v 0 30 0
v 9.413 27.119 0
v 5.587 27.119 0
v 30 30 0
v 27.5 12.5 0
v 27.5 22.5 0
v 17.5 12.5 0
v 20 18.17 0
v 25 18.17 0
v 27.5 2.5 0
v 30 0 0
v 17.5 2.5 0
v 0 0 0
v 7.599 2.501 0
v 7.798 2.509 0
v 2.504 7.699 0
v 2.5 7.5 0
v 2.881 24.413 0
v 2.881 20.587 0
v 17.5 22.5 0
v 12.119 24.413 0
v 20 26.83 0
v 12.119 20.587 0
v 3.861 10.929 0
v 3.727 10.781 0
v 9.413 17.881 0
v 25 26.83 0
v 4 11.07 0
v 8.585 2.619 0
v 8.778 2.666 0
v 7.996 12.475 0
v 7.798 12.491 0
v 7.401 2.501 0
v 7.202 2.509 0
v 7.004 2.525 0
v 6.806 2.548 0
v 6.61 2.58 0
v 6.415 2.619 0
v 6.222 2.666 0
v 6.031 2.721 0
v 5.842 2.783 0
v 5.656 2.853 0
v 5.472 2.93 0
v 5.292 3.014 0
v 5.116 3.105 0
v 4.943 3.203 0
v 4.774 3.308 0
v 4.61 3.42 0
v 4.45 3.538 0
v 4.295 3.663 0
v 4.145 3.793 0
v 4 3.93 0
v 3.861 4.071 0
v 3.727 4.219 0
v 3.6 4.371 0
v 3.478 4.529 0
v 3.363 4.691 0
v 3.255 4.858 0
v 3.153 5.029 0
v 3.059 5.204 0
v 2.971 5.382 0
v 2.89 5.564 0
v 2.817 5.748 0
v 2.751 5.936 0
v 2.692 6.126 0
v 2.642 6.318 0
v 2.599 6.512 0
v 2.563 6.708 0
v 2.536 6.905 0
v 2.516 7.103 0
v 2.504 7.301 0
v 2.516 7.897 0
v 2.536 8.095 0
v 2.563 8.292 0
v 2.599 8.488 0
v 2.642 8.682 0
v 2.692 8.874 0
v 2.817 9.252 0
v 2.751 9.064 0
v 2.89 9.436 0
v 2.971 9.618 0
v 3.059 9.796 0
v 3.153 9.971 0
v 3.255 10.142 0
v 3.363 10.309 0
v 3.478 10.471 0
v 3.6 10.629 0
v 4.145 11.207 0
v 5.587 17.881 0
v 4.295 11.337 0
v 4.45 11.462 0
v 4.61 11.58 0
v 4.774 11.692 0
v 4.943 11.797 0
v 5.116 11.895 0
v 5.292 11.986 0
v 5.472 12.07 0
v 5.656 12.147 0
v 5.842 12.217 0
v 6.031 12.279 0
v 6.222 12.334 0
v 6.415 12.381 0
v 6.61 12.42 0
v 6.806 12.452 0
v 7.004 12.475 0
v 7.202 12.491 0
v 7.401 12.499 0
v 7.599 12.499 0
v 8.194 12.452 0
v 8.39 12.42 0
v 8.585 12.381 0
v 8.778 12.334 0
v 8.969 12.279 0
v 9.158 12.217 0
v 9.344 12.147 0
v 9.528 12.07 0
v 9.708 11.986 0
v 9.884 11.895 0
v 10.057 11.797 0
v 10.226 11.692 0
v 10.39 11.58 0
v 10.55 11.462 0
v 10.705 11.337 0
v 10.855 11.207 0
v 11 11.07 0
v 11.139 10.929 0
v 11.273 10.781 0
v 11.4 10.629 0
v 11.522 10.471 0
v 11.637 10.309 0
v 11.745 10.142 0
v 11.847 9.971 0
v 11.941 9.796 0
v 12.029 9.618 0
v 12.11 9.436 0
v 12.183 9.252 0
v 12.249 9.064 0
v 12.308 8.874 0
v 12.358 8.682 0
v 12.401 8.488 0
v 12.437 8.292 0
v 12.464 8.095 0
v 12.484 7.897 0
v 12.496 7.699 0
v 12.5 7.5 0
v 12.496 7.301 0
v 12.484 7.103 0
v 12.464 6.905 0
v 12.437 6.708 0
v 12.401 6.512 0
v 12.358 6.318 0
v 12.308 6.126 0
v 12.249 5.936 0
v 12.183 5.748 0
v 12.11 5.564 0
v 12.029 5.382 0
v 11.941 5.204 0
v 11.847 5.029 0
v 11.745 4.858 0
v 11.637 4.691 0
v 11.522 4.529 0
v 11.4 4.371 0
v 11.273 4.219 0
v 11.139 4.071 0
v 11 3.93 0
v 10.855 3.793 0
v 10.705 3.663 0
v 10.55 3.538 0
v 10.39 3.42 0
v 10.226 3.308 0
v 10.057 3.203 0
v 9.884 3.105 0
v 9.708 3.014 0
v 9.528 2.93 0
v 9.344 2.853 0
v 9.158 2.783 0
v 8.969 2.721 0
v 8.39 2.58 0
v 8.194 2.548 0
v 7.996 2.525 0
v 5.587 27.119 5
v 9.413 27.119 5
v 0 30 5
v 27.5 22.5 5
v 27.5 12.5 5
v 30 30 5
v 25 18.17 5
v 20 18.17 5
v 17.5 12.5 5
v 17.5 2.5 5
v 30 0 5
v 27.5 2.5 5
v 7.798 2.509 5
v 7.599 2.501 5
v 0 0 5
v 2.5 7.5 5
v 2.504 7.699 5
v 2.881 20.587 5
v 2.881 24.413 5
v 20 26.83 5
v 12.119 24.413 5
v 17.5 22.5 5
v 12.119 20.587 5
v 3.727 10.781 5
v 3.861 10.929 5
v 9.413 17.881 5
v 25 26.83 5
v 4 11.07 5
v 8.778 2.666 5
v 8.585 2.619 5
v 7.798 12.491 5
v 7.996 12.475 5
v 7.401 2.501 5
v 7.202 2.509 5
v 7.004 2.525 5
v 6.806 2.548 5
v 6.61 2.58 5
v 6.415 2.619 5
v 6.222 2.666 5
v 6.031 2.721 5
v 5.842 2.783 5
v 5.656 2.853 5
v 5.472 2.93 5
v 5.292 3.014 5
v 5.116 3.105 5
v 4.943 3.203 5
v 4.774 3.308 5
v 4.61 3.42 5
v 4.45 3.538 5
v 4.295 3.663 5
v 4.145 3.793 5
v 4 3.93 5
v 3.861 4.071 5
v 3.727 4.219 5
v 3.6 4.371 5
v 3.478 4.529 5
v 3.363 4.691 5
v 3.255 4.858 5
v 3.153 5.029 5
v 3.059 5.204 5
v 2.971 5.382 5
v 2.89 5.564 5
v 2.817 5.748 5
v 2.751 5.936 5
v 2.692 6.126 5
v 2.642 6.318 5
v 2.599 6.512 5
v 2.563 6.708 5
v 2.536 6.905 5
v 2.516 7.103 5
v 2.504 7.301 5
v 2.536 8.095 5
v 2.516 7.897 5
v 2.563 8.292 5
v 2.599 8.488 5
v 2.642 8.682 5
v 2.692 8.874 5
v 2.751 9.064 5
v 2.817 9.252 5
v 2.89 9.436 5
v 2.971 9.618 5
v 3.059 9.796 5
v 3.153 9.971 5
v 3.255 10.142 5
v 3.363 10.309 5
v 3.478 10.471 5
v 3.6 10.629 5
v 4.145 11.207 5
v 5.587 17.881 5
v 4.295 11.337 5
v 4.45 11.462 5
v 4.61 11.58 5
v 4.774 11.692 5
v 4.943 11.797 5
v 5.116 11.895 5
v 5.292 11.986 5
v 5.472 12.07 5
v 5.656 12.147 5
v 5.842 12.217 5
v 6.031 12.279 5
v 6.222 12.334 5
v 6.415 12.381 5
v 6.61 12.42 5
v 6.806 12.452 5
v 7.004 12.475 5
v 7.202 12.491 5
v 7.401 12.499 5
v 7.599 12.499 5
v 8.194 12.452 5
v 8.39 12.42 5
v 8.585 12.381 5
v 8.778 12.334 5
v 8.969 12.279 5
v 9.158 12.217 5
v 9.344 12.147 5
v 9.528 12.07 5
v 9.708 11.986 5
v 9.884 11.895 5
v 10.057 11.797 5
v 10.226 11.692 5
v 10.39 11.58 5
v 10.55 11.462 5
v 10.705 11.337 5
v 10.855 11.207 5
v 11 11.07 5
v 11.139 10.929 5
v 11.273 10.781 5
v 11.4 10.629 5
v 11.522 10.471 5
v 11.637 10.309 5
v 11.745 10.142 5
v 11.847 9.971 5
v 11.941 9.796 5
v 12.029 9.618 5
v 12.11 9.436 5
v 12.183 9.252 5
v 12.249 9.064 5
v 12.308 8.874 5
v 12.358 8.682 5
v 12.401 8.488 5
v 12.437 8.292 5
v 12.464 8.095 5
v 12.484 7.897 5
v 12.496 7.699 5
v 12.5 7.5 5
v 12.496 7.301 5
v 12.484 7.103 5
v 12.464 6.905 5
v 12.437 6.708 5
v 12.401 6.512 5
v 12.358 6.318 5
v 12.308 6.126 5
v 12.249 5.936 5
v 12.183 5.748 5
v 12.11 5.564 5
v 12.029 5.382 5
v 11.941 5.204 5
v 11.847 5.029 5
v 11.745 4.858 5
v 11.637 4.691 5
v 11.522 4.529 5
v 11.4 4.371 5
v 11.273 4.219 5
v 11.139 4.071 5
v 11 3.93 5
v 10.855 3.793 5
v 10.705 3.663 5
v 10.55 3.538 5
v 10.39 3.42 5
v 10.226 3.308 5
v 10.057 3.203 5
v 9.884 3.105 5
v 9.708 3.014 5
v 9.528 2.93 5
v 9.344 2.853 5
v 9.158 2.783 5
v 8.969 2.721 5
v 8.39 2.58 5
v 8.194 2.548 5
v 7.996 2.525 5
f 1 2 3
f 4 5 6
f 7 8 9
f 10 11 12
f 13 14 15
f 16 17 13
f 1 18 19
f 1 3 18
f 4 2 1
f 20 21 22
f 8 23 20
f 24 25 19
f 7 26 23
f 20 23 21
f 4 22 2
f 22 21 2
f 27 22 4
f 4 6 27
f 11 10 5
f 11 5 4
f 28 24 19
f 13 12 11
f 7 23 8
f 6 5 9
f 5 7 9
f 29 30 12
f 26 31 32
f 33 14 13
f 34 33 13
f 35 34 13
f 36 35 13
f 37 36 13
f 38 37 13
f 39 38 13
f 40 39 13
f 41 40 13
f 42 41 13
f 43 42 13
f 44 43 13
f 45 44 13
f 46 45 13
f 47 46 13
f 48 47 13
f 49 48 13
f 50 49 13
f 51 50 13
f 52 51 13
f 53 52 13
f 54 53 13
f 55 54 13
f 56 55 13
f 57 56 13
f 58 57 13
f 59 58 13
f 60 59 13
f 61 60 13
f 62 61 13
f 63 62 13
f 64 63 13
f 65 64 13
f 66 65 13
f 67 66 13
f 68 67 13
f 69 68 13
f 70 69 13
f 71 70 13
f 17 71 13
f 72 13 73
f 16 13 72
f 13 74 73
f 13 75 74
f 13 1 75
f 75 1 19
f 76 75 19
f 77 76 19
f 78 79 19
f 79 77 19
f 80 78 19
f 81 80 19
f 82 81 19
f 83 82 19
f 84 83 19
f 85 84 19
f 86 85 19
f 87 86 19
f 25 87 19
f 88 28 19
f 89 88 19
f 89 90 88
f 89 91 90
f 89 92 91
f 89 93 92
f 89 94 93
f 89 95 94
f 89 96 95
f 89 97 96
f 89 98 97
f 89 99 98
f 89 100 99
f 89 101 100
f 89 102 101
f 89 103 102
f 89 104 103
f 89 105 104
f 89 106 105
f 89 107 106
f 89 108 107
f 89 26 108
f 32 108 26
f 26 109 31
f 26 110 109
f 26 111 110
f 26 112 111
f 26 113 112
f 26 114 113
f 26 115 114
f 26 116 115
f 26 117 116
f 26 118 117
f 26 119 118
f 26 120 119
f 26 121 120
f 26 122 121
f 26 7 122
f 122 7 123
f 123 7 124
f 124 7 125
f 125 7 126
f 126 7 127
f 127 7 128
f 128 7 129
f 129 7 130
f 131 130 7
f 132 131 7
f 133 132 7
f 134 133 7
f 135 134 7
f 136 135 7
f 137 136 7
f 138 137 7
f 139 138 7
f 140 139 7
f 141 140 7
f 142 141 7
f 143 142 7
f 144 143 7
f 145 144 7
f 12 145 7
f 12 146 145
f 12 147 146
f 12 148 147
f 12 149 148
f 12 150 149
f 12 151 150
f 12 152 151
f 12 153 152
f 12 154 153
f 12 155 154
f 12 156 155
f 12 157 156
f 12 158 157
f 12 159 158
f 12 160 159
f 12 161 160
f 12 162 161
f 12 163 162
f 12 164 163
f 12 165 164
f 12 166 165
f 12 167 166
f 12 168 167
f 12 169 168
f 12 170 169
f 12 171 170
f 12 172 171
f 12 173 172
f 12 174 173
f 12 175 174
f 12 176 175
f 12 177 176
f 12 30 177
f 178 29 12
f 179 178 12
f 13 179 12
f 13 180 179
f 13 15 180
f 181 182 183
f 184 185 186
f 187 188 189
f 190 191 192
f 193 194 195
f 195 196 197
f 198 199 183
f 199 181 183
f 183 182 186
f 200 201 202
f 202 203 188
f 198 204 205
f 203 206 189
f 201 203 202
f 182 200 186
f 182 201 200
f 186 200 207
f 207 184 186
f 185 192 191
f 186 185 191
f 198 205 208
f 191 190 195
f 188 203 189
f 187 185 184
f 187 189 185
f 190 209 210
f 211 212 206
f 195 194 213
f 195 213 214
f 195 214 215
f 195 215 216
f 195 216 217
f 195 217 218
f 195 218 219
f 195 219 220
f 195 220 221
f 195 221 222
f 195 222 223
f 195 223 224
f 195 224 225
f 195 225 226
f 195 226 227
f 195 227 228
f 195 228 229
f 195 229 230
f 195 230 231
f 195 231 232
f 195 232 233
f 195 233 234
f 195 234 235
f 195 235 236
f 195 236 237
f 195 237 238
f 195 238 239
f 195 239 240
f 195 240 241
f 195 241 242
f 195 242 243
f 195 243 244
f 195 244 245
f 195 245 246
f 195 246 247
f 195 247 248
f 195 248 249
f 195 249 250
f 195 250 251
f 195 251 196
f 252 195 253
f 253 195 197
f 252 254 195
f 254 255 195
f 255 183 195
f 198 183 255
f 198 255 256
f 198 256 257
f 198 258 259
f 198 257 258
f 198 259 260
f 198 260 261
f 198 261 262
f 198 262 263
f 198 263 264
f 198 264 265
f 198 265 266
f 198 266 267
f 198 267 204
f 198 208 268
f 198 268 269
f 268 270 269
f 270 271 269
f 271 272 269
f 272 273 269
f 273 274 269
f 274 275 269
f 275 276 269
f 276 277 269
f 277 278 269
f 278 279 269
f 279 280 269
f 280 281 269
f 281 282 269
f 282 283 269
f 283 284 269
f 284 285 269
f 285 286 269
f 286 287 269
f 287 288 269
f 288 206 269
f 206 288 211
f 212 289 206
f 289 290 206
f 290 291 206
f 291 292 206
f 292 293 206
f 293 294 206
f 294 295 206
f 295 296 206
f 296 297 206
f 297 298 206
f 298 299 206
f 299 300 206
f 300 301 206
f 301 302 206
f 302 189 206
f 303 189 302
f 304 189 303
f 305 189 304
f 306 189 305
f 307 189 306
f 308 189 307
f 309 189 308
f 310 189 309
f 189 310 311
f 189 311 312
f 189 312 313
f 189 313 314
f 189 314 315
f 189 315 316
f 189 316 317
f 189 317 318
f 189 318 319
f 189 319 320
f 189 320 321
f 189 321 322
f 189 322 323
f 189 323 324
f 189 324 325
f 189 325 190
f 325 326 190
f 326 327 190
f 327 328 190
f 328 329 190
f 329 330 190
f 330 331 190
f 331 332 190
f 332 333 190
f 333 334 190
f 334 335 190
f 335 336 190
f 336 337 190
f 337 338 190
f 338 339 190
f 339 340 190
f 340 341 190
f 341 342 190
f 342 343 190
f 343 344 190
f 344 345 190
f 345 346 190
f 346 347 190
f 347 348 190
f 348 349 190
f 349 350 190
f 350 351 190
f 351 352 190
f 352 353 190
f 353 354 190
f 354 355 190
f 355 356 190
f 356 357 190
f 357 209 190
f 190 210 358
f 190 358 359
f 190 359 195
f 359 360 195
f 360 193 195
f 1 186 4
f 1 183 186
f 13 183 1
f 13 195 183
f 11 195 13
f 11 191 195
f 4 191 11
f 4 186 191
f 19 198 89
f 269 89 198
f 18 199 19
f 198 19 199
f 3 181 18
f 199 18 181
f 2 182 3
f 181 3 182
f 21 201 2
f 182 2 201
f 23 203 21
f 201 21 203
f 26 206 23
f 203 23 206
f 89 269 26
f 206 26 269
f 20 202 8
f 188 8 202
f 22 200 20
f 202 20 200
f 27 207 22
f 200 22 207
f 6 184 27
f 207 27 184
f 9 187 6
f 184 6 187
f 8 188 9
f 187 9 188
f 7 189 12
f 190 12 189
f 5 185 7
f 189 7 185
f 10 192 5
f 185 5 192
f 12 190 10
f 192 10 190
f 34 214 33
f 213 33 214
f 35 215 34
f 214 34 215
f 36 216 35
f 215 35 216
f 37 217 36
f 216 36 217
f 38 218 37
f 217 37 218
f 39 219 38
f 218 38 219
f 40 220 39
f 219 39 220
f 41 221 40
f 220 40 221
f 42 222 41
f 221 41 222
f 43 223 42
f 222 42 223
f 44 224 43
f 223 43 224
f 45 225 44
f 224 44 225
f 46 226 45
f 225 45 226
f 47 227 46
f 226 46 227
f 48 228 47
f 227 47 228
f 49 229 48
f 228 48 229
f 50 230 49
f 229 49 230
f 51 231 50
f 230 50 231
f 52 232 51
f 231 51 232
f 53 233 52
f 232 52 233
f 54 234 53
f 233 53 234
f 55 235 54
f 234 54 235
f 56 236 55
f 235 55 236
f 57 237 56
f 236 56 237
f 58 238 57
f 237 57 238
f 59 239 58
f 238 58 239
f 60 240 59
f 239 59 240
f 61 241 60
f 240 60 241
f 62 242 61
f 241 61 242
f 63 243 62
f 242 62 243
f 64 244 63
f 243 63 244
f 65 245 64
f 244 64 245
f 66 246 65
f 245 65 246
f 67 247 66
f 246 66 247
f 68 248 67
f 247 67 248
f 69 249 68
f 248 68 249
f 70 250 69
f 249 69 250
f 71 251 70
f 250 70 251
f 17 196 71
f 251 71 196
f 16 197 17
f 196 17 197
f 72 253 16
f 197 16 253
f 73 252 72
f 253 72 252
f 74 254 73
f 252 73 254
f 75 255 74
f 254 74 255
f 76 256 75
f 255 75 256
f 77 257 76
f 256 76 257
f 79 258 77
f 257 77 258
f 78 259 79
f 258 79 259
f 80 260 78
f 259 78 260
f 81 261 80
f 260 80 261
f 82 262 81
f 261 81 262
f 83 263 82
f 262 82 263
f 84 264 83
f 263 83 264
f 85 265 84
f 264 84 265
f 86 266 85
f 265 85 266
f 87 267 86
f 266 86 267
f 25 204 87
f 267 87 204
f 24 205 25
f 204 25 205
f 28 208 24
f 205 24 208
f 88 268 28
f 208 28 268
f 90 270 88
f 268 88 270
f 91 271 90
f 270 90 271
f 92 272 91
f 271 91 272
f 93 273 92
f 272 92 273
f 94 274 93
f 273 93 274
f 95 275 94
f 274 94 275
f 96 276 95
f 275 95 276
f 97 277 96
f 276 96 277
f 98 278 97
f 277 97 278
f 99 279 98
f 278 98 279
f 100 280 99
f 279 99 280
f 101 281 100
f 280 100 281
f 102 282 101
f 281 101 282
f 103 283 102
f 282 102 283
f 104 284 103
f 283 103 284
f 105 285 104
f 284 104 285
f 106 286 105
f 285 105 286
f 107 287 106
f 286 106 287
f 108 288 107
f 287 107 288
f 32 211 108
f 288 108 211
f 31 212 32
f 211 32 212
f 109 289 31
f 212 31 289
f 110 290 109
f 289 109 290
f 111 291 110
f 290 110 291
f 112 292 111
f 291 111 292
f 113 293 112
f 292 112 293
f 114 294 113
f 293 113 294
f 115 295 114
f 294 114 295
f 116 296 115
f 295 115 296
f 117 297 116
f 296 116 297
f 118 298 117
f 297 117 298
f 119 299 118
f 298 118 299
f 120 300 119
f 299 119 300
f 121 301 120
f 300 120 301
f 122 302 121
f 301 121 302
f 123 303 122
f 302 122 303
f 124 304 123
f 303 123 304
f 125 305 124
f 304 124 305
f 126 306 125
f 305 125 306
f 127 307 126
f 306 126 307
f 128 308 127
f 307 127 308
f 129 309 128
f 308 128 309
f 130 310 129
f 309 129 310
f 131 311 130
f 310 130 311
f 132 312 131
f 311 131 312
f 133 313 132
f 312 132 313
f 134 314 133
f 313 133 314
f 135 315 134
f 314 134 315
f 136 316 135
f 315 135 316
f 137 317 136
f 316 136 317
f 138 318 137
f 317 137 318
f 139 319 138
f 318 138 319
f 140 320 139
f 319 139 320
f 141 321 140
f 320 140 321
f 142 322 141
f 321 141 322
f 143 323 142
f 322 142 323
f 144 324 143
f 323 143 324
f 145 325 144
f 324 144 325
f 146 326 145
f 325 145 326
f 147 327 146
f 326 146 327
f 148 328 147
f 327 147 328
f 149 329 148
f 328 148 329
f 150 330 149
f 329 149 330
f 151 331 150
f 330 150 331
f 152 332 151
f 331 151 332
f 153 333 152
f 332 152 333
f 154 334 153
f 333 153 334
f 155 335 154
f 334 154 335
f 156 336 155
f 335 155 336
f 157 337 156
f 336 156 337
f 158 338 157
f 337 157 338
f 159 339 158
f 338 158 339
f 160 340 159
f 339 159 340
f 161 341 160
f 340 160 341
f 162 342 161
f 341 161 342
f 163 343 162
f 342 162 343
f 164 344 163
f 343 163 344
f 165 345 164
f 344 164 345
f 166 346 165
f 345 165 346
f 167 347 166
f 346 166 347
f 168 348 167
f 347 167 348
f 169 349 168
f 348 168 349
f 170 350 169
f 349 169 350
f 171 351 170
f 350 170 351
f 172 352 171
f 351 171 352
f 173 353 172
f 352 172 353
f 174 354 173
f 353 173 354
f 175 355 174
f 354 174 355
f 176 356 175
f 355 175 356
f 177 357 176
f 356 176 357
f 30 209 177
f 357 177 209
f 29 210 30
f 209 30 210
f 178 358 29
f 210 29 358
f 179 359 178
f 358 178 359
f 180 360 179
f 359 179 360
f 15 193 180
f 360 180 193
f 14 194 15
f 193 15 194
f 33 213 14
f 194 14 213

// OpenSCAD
d = 30;
h = 5;
id = d/3;

$fa = 0.2;
$fs = 0.2;

echo("Outer = ", d, "Inner = ", id);

linear_extrude(h)
difference() {
    square([d,d]);
    
    translate([d/4, d/4]) {    
        circle(d = id);
            
        translate([d/2,0])
        square([id,id], center=true);
        
        translate([0,d/2])
        rotate(90/4)
        circle(d = id, $fn = 8);
        
        translate([d/2,d/2])
        rotate(0)
        circle(d = id, $fn = 6);
    }
}
